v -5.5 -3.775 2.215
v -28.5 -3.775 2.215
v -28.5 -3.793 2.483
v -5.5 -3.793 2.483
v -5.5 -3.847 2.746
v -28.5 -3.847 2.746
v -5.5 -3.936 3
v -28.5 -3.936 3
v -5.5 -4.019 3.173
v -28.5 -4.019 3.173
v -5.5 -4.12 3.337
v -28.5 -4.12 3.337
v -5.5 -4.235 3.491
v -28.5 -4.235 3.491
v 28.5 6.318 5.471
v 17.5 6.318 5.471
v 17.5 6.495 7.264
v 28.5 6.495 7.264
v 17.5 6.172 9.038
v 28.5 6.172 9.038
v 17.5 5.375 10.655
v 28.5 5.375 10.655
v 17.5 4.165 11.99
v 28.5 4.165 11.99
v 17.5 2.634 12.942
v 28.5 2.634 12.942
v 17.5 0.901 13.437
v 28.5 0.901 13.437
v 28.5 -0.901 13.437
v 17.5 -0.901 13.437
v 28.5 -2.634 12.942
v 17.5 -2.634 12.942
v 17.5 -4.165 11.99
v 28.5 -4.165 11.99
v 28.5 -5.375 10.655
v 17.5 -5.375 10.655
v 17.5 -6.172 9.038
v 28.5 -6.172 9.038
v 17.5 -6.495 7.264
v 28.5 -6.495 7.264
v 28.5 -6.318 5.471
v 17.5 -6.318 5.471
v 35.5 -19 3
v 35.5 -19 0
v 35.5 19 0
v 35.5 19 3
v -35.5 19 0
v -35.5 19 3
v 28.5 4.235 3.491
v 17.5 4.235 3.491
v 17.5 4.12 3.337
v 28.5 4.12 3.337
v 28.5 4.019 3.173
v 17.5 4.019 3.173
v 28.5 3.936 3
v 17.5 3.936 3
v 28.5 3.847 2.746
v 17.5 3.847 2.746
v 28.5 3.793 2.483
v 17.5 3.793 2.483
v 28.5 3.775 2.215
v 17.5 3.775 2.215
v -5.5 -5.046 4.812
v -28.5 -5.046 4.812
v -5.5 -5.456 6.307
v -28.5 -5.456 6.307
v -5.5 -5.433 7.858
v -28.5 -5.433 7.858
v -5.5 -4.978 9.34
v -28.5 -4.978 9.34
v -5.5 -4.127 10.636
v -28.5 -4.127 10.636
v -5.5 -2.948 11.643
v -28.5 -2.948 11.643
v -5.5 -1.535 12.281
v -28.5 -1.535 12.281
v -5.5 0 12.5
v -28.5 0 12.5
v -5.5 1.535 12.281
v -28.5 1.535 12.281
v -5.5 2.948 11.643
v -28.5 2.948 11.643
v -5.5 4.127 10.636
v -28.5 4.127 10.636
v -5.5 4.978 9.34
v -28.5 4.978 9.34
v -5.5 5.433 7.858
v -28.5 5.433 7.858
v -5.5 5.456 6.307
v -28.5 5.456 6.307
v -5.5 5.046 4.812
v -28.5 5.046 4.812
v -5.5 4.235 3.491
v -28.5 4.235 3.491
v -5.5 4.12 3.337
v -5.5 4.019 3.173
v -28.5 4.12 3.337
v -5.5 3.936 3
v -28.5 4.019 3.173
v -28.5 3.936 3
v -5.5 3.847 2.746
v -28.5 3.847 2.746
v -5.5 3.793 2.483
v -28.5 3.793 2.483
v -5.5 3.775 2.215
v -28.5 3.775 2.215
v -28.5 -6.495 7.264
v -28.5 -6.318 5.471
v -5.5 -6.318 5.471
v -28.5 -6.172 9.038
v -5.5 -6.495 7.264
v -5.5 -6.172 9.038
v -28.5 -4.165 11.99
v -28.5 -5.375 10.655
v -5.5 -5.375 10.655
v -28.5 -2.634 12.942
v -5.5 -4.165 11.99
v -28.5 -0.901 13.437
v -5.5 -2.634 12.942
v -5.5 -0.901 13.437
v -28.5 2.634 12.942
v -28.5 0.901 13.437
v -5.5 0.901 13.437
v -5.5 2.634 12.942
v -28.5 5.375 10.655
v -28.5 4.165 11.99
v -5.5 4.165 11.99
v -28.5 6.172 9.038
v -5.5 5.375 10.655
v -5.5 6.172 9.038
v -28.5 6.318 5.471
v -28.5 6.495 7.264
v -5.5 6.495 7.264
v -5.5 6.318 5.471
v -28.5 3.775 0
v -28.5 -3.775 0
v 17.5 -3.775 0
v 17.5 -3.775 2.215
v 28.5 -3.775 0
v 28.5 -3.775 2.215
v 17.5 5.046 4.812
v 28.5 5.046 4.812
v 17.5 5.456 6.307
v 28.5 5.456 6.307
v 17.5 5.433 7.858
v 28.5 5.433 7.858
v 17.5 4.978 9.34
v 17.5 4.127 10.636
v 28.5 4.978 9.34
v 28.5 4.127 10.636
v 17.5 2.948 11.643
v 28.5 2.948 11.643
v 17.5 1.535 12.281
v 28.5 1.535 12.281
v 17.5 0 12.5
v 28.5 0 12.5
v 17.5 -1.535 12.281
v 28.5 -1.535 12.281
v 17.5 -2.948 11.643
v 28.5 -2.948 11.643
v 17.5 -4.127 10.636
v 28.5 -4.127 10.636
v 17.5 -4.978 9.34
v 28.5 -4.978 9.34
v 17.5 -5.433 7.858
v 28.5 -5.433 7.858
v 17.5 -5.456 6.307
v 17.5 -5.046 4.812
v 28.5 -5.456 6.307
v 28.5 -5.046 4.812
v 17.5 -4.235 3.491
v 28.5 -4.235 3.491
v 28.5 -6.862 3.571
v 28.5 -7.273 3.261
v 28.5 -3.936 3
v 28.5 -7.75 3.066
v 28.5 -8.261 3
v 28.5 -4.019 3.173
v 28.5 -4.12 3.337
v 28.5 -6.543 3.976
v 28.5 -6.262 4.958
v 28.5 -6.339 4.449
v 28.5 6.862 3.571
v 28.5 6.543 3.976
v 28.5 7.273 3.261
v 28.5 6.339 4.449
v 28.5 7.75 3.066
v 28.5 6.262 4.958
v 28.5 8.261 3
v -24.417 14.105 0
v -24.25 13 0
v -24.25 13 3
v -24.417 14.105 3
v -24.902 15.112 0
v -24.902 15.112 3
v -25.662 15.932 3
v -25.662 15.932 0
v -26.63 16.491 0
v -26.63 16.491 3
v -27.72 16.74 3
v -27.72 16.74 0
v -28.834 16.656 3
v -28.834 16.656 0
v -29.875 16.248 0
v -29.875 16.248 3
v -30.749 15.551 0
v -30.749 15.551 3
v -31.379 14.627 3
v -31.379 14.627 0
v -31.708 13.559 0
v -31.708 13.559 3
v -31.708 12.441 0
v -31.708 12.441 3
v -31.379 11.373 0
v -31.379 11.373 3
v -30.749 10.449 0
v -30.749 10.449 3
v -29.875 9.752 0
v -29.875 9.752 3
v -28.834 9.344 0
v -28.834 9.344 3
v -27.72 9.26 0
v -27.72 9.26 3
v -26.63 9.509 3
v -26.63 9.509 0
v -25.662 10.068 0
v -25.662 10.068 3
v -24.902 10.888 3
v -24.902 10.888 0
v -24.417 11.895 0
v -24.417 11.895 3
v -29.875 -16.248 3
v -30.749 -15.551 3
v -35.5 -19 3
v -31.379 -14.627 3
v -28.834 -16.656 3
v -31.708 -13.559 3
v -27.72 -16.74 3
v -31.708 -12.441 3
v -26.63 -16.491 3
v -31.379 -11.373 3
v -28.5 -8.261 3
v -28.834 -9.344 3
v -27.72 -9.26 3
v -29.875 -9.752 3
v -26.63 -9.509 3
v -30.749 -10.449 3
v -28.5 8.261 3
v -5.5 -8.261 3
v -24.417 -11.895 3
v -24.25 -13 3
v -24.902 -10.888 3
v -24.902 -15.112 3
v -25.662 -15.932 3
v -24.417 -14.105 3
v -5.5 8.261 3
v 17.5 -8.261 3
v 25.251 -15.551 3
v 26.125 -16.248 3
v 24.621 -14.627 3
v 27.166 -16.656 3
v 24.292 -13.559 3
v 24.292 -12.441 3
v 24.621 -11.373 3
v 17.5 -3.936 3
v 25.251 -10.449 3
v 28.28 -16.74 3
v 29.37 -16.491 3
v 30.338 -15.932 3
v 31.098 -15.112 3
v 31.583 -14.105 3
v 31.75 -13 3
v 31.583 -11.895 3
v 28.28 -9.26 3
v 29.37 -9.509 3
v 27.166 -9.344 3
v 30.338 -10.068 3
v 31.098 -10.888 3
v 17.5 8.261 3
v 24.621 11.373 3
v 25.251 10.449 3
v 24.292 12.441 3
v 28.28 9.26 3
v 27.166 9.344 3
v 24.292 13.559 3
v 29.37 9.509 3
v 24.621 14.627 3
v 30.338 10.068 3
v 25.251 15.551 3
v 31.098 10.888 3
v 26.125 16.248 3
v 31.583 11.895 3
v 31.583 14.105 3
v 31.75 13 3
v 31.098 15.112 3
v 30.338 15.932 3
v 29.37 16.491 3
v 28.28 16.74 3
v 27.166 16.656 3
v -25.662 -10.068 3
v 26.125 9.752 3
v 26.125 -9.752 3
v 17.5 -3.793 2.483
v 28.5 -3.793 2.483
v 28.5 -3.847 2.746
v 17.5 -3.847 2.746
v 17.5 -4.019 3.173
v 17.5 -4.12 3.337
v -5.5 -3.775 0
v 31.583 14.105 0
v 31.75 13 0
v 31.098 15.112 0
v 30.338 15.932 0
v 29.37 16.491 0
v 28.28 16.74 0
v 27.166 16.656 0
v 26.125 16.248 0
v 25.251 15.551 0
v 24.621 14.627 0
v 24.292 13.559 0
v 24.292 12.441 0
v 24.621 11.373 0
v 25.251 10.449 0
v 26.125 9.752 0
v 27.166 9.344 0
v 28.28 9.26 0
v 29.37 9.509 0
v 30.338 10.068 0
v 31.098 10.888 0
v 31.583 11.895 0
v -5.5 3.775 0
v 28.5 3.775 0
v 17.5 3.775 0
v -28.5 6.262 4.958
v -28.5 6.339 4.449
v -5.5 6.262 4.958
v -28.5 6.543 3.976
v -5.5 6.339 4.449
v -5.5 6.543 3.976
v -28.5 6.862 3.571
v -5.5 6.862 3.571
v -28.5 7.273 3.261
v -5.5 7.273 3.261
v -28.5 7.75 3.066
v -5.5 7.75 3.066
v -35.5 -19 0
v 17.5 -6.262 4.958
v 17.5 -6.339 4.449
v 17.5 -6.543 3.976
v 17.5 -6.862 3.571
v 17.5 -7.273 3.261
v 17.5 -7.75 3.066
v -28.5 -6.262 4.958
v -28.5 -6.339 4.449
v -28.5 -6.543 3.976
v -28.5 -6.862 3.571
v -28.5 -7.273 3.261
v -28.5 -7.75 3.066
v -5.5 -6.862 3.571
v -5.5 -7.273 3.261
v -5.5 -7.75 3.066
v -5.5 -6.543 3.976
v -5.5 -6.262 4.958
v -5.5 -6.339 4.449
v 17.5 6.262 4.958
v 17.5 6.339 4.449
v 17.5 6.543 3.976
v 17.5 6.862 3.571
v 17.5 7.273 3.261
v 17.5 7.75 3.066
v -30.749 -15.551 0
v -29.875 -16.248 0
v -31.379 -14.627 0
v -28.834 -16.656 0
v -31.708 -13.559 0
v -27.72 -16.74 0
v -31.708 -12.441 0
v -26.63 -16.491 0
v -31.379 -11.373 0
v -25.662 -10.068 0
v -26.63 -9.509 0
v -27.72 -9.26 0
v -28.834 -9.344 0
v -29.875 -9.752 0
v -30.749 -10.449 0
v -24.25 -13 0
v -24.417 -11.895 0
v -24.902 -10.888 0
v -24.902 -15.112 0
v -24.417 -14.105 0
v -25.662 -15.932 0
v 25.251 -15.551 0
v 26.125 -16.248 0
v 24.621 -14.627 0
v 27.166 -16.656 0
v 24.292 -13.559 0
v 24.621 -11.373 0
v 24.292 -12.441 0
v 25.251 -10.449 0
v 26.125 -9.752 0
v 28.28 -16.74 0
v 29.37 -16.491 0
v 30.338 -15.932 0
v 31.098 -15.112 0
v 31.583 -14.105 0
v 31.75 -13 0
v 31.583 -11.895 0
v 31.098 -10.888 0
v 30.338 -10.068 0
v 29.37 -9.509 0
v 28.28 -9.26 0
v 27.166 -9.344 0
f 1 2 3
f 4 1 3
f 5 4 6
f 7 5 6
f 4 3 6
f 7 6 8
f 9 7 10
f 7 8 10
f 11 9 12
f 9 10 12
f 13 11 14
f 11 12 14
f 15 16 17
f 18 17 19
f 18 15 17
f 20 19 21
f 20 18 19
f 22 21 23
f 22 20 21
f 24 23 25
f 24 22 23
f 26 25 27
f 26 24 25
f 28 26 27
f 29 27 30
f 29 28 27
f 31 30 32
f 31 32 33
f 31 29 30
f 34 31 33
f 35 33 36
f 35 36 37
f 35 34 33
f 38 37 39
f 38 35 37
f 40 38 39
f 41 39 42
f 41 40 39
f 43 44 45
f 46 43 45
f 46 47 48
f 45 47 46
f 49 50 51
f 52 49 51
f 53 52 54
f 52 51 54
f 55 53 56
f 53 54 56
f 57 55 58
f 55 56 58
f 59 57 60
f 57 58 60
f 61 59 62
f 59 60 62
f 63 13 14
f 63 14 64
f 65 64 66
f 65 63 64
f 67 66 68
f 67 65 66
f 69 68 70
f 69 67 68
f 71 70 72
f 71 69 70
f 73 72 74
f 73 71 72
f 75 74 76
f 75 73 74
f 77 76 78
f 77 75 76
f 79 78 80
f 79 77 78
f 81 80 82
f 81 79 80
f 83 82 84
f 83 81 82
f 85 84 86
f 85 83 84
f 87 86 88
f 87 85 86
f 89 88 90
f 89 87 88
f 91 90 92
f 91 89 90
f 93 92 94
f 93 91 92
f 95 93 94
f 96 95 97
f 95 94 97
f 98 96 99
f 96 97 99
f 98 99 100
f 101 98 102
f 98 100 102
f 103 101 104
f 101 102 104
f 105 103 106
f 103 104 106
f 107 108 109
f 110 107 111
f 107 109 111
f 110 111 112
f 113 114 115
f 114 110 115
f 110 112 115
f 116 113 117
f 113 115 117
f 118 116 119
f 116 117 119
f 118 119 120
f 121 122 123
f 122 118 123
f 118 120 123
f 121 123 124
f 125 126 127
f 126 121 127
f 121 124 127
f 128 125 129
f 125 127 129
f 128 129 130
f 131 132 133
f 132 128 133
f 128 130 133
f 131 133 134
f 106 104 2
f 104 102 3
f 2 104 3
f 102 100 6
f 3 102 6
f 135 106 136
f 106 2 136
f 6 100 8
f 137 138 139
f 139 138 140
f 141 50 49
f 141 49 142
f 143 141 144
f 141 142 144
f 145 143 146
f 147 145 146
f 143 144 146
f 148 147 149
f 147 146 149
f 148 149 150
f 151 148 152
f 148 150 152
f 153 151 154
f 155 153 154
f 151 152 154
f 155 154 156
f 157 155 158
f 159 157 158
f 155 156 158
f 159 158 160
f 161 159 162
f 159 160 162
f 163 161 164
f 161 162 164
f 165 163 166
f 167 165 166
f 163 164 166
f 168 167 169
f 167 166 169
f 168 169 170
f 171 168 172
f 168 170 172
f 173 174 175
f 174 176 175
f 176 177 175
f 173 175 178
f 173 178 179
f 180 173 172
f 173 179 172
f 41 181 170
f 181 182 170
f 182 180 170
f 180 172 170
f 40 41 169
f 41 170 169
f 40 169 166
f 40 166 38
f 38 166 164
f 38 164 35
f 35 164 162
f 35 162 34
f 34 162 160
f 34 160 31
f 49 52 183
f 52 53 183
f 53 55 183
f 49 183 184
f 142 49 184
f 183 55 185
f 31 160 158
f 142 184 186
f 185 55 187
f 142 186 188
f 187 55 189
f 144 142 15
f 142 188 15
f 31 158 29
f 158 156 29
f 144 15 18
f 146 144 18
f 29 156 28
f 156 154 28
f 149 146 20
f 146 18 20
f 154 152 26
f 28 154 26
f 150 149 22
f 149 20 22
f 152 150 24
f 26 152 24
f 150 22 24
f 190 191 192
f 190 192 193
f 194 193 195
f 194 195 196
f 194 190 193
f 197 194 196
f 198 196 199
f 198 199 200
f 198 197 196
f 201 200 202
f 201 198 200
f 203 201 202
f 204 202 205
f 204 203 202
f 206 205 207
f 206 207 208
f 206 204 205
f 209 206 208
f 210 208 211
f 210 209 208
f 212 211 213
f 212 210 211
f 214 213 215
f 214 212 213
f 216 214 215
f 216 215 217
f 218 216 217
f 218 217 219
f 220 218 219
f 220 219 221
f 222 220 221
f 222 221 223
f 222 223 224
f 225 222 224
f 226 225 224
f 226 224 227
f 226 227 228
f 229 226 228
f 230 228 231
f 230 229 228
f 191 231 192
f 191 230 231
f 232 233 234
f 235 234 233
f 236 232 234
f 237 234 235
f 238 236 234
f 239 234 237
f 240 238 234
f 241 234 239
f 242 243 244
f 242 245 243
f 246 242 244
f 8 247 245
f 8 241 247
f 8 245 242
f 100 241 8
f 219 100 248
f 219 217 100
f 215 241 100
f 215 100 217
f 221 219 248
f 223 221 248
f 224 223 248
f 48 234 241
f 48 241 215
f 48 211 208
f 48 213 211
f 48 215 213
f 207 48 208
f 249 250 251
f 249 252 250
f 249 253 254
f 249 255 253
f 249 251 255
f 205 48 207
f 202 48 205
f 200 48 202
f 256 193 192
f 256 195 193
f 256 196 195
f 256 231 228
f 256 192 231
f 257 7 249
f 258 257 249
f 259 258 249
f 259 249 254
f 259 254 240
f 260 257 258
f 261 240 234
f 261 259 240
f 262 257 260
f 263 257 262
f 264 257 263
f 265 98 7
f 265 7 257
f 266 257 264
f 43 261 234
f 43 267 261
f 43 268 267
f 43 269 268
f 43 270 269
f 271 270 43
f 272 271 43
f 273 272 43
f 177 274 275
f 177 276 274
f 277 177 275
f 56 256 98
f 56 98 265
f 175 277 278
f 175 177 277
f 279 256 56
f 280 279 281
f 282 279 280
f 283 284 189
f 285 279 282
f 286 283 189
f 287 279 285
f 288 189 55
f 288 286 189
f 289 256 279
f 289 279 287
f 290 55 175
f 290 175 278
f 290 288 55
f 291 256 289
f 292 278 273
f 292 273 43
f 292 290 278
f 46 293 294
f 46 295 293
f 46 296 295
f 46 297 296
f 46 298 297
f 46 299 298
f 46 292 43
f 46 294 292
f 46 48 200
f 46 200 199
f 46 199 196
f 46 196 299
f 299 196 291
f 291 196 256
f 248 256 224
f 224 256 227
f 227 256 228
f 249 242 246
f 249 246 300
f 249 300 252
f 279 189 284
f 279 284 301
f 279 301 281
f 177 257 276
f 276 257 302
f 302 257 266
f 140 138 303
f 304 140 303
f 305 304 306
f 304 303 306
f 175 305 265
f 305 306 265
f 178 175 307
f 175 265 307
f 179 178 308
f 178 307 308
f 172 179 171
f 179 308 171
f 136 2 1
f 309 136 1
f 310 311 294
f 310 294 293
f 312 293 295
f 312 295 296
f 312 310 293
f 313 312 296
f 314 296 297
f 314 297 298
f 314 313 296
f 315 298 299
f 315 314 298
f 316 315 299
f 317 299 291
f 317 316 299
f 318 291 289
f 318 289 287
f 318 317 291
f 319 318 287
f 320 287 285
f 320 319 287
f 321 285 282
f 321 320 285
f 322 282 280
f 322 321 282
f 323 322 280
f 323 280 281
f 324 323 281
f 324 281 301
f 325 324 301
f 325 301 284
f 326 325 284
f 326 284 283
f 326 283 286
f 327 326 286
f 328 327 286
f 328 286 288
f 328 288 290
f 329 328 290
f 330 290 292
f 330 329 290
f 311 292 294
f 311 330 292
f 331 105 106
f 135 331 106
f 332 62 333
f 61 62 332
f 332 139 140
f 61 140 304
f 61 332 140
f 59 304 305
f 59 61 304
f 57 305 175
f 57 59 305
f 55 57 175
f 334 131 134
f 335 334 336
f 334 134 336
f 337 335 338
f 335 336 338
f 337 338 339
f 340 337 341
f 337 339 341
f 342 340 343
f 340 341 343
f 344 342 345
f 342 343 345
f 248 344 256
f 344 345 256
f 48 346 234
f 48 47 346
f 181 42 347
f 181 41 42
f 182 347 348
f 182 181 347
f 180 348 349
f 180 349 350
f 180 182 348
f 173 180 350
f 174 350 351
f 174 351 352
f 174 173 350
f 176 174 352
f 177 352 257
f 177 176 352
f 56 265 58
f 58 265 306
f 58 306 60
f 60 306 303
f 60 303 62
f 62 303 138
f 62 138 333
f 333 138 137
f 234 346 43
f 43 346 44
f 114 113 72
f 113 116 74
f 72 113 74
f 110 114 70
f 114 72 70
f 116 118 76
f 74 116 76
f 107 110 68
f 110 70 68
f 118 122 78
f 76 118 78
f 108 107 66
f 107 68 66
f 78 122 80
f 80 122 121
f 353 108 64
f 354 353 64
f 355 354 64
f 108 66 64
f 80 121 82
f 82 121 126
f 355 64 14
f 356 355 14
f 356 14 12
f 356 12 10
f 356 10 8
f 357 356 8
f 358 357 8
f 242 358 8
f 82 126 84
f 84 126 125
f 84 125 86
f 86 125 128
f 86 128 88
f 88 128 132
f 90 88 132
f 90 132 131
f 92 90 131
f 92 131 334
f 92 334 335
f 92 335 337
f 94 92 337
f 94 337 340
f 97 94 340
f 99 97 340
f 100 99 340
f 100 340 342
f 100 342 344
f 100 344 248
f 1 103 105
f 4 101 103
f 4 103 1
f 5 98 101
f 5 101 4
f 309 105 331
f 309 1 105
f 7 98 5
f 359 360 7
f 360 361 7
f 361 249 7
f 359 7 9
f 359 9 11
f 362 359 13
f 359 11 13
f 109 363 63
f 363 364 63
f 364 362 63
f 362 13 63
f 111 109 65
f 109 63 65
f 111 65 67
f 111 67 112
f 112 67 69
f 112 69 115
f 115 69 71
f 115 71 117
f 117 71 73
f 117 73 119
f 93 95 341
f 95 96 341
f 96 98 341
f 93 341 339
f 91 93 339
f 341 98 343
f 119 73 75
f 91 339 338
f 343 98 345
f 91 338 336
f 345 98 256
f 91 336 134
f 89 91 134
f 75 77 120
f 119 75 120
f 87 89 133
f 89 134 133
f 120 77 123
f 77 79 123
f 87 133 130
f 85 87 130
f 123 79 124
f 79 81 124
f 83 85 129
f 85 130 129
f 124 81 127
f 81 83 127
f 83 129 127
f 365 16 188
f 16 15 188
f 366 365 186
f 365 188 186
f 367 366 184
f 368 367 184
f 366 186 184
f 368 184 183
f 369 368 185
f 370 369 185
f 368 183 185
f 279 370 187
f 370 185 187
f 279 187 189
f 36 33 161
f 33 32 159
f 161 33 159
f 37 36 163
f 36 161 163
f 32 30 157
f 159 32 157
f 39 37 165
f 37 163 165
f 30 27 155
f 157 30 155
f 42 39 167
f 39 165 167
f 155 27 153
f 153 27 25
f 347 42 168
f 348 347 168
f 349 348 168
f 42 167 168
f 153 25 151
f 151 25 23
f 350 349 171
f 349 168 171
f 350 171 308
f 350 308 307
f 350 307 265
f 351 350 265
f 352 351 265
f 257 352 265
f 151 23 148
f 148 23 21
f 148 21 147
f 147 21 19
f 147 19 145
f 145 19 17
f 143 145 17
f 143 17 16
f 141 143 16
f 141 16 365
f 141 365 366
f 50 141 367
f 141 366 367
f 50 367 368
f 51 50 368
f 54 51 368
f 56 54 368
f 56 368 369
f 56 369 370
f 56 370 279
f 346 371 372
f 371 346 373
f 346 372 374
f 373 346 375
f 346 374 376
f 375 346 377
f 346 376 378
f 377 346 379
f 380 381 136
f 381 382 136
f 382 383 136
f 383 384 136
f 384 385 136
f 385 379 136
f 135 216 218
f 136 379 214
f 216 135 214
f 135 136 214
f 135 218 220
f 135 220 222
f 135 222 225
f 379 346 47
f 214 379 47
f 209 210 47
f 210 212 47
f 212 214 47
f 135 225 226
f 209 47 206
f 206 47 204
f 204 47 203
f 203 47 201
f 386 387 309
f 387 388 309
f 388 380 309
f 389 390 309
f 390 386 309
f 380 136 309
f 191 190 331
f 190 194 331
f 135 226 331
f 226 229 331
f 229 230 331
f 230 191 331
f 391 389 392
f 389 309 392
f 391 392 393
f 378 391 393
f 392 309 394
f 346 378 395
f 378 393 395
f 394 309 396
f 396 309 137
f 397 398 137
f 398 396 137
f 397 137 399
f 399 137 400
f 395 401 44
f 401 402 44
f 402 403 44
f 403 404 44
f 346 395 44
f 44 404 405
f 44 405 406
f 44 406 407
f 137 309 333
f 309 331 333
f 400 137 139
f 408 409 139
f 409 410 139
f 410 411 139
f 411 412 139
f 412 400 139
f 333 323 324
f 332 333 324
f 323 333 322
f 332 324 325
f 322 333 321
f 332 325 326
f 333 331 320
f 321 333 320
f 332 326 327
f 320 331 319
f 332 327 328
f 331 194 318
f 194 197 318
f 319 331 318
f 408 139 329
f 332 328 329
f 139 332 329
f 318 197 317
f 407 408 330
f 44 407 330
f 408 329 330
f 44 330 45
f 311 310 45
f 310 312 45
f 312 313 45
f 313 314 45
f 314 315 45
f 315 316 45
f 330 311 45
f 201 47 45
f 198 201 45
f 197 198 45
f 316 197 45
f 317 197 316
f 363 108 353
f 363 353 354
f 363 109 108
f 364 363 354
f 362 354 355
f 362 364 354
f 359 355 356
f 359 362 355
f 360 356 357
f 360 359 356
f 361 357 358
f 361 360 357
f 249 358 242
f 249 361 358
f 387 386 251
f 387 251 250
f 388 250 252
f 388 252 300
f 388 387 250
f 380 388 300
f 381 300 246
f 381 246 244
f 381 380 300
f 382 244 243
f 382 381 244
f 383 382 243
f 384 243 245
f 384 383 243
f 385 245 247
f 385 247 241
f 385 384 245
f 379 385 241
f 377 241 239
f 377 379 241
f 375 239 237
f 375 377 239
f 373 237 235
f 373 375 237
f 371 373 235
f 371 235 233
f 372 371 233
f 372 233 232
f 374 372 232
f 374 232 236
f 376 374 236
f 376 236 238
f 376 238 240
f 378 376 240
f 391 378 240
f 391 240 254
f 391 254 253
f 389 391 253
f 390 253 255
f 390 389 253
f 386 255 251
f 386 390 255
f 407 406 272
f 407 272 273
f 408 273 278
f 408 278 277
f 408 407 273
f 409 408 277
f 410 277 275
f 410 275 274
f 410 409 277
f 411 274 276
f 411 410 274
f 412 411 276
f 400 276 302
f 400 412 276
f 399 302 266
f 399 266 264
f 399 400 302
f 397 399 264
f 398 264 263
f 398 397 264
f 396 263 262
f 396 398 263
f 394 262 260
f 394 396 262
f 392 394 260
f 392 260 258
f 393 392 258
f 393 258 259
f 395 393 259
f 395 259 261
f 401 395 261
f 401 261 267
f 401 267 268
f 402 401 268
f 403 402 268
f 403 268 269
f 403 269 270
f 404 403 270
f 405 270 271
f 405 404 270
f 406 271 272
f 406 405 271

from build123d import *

# Parameters (mm, degrees)
SKETCH1_W           = 71
SKETCH1_H           = 38
SKETCH1_R           = 3.7499999999999996
SKETCH1_R_2         = 3.750000000000006
BOSS_EXTRUDE1_DEPTH = 3
SKETCH3_R           = 6.500000000000002
SKETCH3_R_2         = 5.5
BOSS_EXTRUDE2_DEPTH = 18
BOSS_EXTRUDE3_START = -30
SKETCH4_R           = 6.500000000000001
SKETCH4_R_2         = 5.499999999999999
BOSS_EXTRUDE3_DEPTH = 30
SKETCH5_W           = 11
SKETCH5_H           = 7.54983443527075
CUT_EXTRUDE2_DEPTH  = 30
CUT_EXTRUDE3_START  = -7
CUT_EXTRUDE3_DEPTH  = 7
CUT_EXTRUDE4_DEPTH  = 7
FILLET2_R           = 2
FILLET3_R           = 2


with BuildPart() as part:
    # Sketch1 → Boss-Extrude1 (new body)
    with BuildSketch(Plane.XY):
        Rectangle(SKETCH1_W, SKETCH1_H)
        with Locations((-27.999999999999996, 13.000000000000004)):
            Circle(SKETCH1_R, mode=Mode.SUBTRACT)
        with Locations((27.999999999999996, 13)):
            Circle(SKETCH1_R, mode=Mode.SUBTRACT)
        with Locations((-27.999999999999996, -12.999999999999996)):
            Circle(SKETCH1_R, mode=Mode.SUBTRACT)
        with Locations((27.999999999999996, -12.999999999999996)):
            Circle(SKETCH1_R_2, mode=Mode.SUBTRACT)
    extrude(amount=BOSS_EXTRUDE1_DEPTH)

    # Sketch3 → Boss-Extrude2 (add)
    with BuildSketch(Plane(origin=(35.5, 0, 0), x_dir=(0, 0, -1), z_dir=(1, 0, 0))):
        with Locations((-7, 3.47e-15)):
            Circle(SKETCH3_R)
        with Locations((-7, 3.47e-15)):
            Circle(SKETCH3_R_2, mode=Mode.SUBTRACT)
    extrude(amount=-BOSS_EXTRUDE2_DEPTH)

    # Sketch4 → Boss-Extrude3 (add)
    with BuildSketch(Plane.ZY.offset(35.5).offset(BOSS_EXTRUDE3_START)):
        with Locations((7, 3.47e-15)):
            Circle(SKETCH4_R)
        with Locations((7, 3.47e-15)):
            Circle(SKETCH4_R_2, mode=Mode.SUBTRACT)
    extrude(amount=BOSS_EXTRUDE3_DEPTH)

    # Sketch5 → Cut-Extrude2 (cut)
    with BuildSketch(Plane.XY.offset(3)):
        Polygon((-5.499999999999998, 3.7749172176353767), (-28.499999999999996, 3.7749172176353745), (-28.499999999999996, -3.77491721763537), (-5.499999999999998, -3.77491721763537), align=None)
        with Locations((22.999999999999996, 3.33e-15)):
            Rectangle(SKETCH5_W, SKETCH5_H)
    extrude(amount=-CUT_EXTRUDE2_DEPTH, mode=Mode.SUBTRACT)

    # Sketch6 → Cut-Extrude3 (cut)
    with BuildSketch(Plane.ZY.offset(35.5).offset(CUT_EXTRUDE3_START)):
        with BuildLine():
            Line((3, 3.7749172176353767), (3, 5.123475382979803))
            ThreePointArc((3, 5.123475382979803), (13.5, 6.36e-15), (3, -5.123475382979797))
            Line((3, -5.123475382979797), (3, -3.77491721763537))
            ThreePointArc((3, -3.77491721763537), (12.5, 3.47e-15), (3, 3.7749172176353767))
        make_face()
    extrude(amount=CUT_EXTRUDE3_DEPTH, mode=Mode.SUBTRACT)

    # Sketch7 → Cut-Extrude4 (cut)
    with BuildSketch(Plane(origin=(35.5, 0, 0), x_dir=(0, 0, -1), z_dir=(1, 0, 0))):
        with BuildLine():
            Line((-3, 5.123475382979803), (-3, 3.774917217635378))
            ThreePointArc((-3, 3.774917217635378), (-12.5, 4.14e-15), (-3, -3.774917217635371))
            Line((-3, -3.774917217635371), (-3, -5.123475382979797))
            ThreePointArc((-3, -5.123475382979797), (-13.5, 4.27e-15), (-3, 5.123475382979803))
        make_face()
    extrude(amount=-CUT_EXTRUDE4_DEPTH, mode=Mode.SUBTRACT)

    # Fillet2
    fillet2_edges = [part.edges().sort_by_distance(p)[0] for p in [
        (-17, 5.123475382979804, 3),
        (23, -5.123475382979798, 3),
        (23, 5.123475382979805, 3),
        (-17, -5.123475382979797, 3),
    ]]
    fillet(fillet2_edges, radius=FILLET2_R)

    # Fillet3
    # the kernel refuses this fillet: 2 mm, written as the material it takes off along each edge
    with BuildSketch(Plane(origin=(17.5, 3.7749172176353785, 3), x_dir=(0, 0, -1), z_dir=(1, 0, 0))) as fillet3_piece_1:
        with BuildLine():
            CenterArc((0.7854290434049434, 2), FILLET3_R, 230.35289769223547, 39.6471023077645)
            ThreePointArc((-0.49068536816965125, 0.460022075297303), (-0.2383040211369254, 0.23751887065380473), (0, 0))
            Line((0, 0), (0.7854290434049434, 0))
        make_face()
    extrude(amount=10.999999999999996, mode=Mode.SUBTRACT)
    with BuildSketch(Plane(origin=(-28.499999999999996, -3.77491721763537, 3), x_dir=(0, 5.7e-16, -1), z_dir=(1, 0, 0))) as fillet3_piece_2:
        with BuildLine():
            CenterArc((0.7854290434049418, -2), FILLET3_R, 89.99999999999997, 39.64710230776453)
            ThreePointArc((-0.49068536816965286, -0.46002207529730227), (-0.23830402113692464, -0.23751887065380414), (0, 0))
            Line((0, 0), (0.7854290434049429, 0))
        make_face()
    extrude(amount=22.999999999999996, mode=Mode.SUBTRACT)
    with BuildSketch(Plane(origin=(17.5, -3.7749172176353714, 3), x_dir=(0, -0.6839447234296507, 0.7295338342343956), z_dir=(1, 0, 0))) as fillet3_piece_3:
        with BuildLine():
            CenterArc((0.7948923853050224, 1.9962577183336636), FILLET3_R, 226.84732795972278, 39.647102307770695)
            Line((-0.572997061554437, 0.5371900498650203), (0, 0))
            ThreePointArc((0, 0), (0.33630062455212534, 0.01029127458242615), (0.6726012491042509, 1e-17))
        make_face()
    extrude(amount=10.999999999999996, mode=Mode.SUBTRACT)
    with BuildSketch(Plane(origin=(-28.499999999999996, 3.774917217635377, 3), x_dir=(0, 0.6839447234296516, 0.7295338342343948), z_dir=(1, 0, 0))) as fillet3_piece_4:
        with BuildLine():
            CenterArc((0.7948923853050189, -1.9962577183336638), FILLET3_R, 93.50556973250654, 39.647102307770794)
            Line((-0.5729970615544441, -0.5371900498650239), (0, 0))
            ThreePointArc((0, 0), (0.3363006245521229, -0.01029127458242505), (0.6726012491042468, -6e-17))
        make_face()
    extrude(amount=22.999999999999996, mode=Mode.SUBTRACT)


solid = part.part
